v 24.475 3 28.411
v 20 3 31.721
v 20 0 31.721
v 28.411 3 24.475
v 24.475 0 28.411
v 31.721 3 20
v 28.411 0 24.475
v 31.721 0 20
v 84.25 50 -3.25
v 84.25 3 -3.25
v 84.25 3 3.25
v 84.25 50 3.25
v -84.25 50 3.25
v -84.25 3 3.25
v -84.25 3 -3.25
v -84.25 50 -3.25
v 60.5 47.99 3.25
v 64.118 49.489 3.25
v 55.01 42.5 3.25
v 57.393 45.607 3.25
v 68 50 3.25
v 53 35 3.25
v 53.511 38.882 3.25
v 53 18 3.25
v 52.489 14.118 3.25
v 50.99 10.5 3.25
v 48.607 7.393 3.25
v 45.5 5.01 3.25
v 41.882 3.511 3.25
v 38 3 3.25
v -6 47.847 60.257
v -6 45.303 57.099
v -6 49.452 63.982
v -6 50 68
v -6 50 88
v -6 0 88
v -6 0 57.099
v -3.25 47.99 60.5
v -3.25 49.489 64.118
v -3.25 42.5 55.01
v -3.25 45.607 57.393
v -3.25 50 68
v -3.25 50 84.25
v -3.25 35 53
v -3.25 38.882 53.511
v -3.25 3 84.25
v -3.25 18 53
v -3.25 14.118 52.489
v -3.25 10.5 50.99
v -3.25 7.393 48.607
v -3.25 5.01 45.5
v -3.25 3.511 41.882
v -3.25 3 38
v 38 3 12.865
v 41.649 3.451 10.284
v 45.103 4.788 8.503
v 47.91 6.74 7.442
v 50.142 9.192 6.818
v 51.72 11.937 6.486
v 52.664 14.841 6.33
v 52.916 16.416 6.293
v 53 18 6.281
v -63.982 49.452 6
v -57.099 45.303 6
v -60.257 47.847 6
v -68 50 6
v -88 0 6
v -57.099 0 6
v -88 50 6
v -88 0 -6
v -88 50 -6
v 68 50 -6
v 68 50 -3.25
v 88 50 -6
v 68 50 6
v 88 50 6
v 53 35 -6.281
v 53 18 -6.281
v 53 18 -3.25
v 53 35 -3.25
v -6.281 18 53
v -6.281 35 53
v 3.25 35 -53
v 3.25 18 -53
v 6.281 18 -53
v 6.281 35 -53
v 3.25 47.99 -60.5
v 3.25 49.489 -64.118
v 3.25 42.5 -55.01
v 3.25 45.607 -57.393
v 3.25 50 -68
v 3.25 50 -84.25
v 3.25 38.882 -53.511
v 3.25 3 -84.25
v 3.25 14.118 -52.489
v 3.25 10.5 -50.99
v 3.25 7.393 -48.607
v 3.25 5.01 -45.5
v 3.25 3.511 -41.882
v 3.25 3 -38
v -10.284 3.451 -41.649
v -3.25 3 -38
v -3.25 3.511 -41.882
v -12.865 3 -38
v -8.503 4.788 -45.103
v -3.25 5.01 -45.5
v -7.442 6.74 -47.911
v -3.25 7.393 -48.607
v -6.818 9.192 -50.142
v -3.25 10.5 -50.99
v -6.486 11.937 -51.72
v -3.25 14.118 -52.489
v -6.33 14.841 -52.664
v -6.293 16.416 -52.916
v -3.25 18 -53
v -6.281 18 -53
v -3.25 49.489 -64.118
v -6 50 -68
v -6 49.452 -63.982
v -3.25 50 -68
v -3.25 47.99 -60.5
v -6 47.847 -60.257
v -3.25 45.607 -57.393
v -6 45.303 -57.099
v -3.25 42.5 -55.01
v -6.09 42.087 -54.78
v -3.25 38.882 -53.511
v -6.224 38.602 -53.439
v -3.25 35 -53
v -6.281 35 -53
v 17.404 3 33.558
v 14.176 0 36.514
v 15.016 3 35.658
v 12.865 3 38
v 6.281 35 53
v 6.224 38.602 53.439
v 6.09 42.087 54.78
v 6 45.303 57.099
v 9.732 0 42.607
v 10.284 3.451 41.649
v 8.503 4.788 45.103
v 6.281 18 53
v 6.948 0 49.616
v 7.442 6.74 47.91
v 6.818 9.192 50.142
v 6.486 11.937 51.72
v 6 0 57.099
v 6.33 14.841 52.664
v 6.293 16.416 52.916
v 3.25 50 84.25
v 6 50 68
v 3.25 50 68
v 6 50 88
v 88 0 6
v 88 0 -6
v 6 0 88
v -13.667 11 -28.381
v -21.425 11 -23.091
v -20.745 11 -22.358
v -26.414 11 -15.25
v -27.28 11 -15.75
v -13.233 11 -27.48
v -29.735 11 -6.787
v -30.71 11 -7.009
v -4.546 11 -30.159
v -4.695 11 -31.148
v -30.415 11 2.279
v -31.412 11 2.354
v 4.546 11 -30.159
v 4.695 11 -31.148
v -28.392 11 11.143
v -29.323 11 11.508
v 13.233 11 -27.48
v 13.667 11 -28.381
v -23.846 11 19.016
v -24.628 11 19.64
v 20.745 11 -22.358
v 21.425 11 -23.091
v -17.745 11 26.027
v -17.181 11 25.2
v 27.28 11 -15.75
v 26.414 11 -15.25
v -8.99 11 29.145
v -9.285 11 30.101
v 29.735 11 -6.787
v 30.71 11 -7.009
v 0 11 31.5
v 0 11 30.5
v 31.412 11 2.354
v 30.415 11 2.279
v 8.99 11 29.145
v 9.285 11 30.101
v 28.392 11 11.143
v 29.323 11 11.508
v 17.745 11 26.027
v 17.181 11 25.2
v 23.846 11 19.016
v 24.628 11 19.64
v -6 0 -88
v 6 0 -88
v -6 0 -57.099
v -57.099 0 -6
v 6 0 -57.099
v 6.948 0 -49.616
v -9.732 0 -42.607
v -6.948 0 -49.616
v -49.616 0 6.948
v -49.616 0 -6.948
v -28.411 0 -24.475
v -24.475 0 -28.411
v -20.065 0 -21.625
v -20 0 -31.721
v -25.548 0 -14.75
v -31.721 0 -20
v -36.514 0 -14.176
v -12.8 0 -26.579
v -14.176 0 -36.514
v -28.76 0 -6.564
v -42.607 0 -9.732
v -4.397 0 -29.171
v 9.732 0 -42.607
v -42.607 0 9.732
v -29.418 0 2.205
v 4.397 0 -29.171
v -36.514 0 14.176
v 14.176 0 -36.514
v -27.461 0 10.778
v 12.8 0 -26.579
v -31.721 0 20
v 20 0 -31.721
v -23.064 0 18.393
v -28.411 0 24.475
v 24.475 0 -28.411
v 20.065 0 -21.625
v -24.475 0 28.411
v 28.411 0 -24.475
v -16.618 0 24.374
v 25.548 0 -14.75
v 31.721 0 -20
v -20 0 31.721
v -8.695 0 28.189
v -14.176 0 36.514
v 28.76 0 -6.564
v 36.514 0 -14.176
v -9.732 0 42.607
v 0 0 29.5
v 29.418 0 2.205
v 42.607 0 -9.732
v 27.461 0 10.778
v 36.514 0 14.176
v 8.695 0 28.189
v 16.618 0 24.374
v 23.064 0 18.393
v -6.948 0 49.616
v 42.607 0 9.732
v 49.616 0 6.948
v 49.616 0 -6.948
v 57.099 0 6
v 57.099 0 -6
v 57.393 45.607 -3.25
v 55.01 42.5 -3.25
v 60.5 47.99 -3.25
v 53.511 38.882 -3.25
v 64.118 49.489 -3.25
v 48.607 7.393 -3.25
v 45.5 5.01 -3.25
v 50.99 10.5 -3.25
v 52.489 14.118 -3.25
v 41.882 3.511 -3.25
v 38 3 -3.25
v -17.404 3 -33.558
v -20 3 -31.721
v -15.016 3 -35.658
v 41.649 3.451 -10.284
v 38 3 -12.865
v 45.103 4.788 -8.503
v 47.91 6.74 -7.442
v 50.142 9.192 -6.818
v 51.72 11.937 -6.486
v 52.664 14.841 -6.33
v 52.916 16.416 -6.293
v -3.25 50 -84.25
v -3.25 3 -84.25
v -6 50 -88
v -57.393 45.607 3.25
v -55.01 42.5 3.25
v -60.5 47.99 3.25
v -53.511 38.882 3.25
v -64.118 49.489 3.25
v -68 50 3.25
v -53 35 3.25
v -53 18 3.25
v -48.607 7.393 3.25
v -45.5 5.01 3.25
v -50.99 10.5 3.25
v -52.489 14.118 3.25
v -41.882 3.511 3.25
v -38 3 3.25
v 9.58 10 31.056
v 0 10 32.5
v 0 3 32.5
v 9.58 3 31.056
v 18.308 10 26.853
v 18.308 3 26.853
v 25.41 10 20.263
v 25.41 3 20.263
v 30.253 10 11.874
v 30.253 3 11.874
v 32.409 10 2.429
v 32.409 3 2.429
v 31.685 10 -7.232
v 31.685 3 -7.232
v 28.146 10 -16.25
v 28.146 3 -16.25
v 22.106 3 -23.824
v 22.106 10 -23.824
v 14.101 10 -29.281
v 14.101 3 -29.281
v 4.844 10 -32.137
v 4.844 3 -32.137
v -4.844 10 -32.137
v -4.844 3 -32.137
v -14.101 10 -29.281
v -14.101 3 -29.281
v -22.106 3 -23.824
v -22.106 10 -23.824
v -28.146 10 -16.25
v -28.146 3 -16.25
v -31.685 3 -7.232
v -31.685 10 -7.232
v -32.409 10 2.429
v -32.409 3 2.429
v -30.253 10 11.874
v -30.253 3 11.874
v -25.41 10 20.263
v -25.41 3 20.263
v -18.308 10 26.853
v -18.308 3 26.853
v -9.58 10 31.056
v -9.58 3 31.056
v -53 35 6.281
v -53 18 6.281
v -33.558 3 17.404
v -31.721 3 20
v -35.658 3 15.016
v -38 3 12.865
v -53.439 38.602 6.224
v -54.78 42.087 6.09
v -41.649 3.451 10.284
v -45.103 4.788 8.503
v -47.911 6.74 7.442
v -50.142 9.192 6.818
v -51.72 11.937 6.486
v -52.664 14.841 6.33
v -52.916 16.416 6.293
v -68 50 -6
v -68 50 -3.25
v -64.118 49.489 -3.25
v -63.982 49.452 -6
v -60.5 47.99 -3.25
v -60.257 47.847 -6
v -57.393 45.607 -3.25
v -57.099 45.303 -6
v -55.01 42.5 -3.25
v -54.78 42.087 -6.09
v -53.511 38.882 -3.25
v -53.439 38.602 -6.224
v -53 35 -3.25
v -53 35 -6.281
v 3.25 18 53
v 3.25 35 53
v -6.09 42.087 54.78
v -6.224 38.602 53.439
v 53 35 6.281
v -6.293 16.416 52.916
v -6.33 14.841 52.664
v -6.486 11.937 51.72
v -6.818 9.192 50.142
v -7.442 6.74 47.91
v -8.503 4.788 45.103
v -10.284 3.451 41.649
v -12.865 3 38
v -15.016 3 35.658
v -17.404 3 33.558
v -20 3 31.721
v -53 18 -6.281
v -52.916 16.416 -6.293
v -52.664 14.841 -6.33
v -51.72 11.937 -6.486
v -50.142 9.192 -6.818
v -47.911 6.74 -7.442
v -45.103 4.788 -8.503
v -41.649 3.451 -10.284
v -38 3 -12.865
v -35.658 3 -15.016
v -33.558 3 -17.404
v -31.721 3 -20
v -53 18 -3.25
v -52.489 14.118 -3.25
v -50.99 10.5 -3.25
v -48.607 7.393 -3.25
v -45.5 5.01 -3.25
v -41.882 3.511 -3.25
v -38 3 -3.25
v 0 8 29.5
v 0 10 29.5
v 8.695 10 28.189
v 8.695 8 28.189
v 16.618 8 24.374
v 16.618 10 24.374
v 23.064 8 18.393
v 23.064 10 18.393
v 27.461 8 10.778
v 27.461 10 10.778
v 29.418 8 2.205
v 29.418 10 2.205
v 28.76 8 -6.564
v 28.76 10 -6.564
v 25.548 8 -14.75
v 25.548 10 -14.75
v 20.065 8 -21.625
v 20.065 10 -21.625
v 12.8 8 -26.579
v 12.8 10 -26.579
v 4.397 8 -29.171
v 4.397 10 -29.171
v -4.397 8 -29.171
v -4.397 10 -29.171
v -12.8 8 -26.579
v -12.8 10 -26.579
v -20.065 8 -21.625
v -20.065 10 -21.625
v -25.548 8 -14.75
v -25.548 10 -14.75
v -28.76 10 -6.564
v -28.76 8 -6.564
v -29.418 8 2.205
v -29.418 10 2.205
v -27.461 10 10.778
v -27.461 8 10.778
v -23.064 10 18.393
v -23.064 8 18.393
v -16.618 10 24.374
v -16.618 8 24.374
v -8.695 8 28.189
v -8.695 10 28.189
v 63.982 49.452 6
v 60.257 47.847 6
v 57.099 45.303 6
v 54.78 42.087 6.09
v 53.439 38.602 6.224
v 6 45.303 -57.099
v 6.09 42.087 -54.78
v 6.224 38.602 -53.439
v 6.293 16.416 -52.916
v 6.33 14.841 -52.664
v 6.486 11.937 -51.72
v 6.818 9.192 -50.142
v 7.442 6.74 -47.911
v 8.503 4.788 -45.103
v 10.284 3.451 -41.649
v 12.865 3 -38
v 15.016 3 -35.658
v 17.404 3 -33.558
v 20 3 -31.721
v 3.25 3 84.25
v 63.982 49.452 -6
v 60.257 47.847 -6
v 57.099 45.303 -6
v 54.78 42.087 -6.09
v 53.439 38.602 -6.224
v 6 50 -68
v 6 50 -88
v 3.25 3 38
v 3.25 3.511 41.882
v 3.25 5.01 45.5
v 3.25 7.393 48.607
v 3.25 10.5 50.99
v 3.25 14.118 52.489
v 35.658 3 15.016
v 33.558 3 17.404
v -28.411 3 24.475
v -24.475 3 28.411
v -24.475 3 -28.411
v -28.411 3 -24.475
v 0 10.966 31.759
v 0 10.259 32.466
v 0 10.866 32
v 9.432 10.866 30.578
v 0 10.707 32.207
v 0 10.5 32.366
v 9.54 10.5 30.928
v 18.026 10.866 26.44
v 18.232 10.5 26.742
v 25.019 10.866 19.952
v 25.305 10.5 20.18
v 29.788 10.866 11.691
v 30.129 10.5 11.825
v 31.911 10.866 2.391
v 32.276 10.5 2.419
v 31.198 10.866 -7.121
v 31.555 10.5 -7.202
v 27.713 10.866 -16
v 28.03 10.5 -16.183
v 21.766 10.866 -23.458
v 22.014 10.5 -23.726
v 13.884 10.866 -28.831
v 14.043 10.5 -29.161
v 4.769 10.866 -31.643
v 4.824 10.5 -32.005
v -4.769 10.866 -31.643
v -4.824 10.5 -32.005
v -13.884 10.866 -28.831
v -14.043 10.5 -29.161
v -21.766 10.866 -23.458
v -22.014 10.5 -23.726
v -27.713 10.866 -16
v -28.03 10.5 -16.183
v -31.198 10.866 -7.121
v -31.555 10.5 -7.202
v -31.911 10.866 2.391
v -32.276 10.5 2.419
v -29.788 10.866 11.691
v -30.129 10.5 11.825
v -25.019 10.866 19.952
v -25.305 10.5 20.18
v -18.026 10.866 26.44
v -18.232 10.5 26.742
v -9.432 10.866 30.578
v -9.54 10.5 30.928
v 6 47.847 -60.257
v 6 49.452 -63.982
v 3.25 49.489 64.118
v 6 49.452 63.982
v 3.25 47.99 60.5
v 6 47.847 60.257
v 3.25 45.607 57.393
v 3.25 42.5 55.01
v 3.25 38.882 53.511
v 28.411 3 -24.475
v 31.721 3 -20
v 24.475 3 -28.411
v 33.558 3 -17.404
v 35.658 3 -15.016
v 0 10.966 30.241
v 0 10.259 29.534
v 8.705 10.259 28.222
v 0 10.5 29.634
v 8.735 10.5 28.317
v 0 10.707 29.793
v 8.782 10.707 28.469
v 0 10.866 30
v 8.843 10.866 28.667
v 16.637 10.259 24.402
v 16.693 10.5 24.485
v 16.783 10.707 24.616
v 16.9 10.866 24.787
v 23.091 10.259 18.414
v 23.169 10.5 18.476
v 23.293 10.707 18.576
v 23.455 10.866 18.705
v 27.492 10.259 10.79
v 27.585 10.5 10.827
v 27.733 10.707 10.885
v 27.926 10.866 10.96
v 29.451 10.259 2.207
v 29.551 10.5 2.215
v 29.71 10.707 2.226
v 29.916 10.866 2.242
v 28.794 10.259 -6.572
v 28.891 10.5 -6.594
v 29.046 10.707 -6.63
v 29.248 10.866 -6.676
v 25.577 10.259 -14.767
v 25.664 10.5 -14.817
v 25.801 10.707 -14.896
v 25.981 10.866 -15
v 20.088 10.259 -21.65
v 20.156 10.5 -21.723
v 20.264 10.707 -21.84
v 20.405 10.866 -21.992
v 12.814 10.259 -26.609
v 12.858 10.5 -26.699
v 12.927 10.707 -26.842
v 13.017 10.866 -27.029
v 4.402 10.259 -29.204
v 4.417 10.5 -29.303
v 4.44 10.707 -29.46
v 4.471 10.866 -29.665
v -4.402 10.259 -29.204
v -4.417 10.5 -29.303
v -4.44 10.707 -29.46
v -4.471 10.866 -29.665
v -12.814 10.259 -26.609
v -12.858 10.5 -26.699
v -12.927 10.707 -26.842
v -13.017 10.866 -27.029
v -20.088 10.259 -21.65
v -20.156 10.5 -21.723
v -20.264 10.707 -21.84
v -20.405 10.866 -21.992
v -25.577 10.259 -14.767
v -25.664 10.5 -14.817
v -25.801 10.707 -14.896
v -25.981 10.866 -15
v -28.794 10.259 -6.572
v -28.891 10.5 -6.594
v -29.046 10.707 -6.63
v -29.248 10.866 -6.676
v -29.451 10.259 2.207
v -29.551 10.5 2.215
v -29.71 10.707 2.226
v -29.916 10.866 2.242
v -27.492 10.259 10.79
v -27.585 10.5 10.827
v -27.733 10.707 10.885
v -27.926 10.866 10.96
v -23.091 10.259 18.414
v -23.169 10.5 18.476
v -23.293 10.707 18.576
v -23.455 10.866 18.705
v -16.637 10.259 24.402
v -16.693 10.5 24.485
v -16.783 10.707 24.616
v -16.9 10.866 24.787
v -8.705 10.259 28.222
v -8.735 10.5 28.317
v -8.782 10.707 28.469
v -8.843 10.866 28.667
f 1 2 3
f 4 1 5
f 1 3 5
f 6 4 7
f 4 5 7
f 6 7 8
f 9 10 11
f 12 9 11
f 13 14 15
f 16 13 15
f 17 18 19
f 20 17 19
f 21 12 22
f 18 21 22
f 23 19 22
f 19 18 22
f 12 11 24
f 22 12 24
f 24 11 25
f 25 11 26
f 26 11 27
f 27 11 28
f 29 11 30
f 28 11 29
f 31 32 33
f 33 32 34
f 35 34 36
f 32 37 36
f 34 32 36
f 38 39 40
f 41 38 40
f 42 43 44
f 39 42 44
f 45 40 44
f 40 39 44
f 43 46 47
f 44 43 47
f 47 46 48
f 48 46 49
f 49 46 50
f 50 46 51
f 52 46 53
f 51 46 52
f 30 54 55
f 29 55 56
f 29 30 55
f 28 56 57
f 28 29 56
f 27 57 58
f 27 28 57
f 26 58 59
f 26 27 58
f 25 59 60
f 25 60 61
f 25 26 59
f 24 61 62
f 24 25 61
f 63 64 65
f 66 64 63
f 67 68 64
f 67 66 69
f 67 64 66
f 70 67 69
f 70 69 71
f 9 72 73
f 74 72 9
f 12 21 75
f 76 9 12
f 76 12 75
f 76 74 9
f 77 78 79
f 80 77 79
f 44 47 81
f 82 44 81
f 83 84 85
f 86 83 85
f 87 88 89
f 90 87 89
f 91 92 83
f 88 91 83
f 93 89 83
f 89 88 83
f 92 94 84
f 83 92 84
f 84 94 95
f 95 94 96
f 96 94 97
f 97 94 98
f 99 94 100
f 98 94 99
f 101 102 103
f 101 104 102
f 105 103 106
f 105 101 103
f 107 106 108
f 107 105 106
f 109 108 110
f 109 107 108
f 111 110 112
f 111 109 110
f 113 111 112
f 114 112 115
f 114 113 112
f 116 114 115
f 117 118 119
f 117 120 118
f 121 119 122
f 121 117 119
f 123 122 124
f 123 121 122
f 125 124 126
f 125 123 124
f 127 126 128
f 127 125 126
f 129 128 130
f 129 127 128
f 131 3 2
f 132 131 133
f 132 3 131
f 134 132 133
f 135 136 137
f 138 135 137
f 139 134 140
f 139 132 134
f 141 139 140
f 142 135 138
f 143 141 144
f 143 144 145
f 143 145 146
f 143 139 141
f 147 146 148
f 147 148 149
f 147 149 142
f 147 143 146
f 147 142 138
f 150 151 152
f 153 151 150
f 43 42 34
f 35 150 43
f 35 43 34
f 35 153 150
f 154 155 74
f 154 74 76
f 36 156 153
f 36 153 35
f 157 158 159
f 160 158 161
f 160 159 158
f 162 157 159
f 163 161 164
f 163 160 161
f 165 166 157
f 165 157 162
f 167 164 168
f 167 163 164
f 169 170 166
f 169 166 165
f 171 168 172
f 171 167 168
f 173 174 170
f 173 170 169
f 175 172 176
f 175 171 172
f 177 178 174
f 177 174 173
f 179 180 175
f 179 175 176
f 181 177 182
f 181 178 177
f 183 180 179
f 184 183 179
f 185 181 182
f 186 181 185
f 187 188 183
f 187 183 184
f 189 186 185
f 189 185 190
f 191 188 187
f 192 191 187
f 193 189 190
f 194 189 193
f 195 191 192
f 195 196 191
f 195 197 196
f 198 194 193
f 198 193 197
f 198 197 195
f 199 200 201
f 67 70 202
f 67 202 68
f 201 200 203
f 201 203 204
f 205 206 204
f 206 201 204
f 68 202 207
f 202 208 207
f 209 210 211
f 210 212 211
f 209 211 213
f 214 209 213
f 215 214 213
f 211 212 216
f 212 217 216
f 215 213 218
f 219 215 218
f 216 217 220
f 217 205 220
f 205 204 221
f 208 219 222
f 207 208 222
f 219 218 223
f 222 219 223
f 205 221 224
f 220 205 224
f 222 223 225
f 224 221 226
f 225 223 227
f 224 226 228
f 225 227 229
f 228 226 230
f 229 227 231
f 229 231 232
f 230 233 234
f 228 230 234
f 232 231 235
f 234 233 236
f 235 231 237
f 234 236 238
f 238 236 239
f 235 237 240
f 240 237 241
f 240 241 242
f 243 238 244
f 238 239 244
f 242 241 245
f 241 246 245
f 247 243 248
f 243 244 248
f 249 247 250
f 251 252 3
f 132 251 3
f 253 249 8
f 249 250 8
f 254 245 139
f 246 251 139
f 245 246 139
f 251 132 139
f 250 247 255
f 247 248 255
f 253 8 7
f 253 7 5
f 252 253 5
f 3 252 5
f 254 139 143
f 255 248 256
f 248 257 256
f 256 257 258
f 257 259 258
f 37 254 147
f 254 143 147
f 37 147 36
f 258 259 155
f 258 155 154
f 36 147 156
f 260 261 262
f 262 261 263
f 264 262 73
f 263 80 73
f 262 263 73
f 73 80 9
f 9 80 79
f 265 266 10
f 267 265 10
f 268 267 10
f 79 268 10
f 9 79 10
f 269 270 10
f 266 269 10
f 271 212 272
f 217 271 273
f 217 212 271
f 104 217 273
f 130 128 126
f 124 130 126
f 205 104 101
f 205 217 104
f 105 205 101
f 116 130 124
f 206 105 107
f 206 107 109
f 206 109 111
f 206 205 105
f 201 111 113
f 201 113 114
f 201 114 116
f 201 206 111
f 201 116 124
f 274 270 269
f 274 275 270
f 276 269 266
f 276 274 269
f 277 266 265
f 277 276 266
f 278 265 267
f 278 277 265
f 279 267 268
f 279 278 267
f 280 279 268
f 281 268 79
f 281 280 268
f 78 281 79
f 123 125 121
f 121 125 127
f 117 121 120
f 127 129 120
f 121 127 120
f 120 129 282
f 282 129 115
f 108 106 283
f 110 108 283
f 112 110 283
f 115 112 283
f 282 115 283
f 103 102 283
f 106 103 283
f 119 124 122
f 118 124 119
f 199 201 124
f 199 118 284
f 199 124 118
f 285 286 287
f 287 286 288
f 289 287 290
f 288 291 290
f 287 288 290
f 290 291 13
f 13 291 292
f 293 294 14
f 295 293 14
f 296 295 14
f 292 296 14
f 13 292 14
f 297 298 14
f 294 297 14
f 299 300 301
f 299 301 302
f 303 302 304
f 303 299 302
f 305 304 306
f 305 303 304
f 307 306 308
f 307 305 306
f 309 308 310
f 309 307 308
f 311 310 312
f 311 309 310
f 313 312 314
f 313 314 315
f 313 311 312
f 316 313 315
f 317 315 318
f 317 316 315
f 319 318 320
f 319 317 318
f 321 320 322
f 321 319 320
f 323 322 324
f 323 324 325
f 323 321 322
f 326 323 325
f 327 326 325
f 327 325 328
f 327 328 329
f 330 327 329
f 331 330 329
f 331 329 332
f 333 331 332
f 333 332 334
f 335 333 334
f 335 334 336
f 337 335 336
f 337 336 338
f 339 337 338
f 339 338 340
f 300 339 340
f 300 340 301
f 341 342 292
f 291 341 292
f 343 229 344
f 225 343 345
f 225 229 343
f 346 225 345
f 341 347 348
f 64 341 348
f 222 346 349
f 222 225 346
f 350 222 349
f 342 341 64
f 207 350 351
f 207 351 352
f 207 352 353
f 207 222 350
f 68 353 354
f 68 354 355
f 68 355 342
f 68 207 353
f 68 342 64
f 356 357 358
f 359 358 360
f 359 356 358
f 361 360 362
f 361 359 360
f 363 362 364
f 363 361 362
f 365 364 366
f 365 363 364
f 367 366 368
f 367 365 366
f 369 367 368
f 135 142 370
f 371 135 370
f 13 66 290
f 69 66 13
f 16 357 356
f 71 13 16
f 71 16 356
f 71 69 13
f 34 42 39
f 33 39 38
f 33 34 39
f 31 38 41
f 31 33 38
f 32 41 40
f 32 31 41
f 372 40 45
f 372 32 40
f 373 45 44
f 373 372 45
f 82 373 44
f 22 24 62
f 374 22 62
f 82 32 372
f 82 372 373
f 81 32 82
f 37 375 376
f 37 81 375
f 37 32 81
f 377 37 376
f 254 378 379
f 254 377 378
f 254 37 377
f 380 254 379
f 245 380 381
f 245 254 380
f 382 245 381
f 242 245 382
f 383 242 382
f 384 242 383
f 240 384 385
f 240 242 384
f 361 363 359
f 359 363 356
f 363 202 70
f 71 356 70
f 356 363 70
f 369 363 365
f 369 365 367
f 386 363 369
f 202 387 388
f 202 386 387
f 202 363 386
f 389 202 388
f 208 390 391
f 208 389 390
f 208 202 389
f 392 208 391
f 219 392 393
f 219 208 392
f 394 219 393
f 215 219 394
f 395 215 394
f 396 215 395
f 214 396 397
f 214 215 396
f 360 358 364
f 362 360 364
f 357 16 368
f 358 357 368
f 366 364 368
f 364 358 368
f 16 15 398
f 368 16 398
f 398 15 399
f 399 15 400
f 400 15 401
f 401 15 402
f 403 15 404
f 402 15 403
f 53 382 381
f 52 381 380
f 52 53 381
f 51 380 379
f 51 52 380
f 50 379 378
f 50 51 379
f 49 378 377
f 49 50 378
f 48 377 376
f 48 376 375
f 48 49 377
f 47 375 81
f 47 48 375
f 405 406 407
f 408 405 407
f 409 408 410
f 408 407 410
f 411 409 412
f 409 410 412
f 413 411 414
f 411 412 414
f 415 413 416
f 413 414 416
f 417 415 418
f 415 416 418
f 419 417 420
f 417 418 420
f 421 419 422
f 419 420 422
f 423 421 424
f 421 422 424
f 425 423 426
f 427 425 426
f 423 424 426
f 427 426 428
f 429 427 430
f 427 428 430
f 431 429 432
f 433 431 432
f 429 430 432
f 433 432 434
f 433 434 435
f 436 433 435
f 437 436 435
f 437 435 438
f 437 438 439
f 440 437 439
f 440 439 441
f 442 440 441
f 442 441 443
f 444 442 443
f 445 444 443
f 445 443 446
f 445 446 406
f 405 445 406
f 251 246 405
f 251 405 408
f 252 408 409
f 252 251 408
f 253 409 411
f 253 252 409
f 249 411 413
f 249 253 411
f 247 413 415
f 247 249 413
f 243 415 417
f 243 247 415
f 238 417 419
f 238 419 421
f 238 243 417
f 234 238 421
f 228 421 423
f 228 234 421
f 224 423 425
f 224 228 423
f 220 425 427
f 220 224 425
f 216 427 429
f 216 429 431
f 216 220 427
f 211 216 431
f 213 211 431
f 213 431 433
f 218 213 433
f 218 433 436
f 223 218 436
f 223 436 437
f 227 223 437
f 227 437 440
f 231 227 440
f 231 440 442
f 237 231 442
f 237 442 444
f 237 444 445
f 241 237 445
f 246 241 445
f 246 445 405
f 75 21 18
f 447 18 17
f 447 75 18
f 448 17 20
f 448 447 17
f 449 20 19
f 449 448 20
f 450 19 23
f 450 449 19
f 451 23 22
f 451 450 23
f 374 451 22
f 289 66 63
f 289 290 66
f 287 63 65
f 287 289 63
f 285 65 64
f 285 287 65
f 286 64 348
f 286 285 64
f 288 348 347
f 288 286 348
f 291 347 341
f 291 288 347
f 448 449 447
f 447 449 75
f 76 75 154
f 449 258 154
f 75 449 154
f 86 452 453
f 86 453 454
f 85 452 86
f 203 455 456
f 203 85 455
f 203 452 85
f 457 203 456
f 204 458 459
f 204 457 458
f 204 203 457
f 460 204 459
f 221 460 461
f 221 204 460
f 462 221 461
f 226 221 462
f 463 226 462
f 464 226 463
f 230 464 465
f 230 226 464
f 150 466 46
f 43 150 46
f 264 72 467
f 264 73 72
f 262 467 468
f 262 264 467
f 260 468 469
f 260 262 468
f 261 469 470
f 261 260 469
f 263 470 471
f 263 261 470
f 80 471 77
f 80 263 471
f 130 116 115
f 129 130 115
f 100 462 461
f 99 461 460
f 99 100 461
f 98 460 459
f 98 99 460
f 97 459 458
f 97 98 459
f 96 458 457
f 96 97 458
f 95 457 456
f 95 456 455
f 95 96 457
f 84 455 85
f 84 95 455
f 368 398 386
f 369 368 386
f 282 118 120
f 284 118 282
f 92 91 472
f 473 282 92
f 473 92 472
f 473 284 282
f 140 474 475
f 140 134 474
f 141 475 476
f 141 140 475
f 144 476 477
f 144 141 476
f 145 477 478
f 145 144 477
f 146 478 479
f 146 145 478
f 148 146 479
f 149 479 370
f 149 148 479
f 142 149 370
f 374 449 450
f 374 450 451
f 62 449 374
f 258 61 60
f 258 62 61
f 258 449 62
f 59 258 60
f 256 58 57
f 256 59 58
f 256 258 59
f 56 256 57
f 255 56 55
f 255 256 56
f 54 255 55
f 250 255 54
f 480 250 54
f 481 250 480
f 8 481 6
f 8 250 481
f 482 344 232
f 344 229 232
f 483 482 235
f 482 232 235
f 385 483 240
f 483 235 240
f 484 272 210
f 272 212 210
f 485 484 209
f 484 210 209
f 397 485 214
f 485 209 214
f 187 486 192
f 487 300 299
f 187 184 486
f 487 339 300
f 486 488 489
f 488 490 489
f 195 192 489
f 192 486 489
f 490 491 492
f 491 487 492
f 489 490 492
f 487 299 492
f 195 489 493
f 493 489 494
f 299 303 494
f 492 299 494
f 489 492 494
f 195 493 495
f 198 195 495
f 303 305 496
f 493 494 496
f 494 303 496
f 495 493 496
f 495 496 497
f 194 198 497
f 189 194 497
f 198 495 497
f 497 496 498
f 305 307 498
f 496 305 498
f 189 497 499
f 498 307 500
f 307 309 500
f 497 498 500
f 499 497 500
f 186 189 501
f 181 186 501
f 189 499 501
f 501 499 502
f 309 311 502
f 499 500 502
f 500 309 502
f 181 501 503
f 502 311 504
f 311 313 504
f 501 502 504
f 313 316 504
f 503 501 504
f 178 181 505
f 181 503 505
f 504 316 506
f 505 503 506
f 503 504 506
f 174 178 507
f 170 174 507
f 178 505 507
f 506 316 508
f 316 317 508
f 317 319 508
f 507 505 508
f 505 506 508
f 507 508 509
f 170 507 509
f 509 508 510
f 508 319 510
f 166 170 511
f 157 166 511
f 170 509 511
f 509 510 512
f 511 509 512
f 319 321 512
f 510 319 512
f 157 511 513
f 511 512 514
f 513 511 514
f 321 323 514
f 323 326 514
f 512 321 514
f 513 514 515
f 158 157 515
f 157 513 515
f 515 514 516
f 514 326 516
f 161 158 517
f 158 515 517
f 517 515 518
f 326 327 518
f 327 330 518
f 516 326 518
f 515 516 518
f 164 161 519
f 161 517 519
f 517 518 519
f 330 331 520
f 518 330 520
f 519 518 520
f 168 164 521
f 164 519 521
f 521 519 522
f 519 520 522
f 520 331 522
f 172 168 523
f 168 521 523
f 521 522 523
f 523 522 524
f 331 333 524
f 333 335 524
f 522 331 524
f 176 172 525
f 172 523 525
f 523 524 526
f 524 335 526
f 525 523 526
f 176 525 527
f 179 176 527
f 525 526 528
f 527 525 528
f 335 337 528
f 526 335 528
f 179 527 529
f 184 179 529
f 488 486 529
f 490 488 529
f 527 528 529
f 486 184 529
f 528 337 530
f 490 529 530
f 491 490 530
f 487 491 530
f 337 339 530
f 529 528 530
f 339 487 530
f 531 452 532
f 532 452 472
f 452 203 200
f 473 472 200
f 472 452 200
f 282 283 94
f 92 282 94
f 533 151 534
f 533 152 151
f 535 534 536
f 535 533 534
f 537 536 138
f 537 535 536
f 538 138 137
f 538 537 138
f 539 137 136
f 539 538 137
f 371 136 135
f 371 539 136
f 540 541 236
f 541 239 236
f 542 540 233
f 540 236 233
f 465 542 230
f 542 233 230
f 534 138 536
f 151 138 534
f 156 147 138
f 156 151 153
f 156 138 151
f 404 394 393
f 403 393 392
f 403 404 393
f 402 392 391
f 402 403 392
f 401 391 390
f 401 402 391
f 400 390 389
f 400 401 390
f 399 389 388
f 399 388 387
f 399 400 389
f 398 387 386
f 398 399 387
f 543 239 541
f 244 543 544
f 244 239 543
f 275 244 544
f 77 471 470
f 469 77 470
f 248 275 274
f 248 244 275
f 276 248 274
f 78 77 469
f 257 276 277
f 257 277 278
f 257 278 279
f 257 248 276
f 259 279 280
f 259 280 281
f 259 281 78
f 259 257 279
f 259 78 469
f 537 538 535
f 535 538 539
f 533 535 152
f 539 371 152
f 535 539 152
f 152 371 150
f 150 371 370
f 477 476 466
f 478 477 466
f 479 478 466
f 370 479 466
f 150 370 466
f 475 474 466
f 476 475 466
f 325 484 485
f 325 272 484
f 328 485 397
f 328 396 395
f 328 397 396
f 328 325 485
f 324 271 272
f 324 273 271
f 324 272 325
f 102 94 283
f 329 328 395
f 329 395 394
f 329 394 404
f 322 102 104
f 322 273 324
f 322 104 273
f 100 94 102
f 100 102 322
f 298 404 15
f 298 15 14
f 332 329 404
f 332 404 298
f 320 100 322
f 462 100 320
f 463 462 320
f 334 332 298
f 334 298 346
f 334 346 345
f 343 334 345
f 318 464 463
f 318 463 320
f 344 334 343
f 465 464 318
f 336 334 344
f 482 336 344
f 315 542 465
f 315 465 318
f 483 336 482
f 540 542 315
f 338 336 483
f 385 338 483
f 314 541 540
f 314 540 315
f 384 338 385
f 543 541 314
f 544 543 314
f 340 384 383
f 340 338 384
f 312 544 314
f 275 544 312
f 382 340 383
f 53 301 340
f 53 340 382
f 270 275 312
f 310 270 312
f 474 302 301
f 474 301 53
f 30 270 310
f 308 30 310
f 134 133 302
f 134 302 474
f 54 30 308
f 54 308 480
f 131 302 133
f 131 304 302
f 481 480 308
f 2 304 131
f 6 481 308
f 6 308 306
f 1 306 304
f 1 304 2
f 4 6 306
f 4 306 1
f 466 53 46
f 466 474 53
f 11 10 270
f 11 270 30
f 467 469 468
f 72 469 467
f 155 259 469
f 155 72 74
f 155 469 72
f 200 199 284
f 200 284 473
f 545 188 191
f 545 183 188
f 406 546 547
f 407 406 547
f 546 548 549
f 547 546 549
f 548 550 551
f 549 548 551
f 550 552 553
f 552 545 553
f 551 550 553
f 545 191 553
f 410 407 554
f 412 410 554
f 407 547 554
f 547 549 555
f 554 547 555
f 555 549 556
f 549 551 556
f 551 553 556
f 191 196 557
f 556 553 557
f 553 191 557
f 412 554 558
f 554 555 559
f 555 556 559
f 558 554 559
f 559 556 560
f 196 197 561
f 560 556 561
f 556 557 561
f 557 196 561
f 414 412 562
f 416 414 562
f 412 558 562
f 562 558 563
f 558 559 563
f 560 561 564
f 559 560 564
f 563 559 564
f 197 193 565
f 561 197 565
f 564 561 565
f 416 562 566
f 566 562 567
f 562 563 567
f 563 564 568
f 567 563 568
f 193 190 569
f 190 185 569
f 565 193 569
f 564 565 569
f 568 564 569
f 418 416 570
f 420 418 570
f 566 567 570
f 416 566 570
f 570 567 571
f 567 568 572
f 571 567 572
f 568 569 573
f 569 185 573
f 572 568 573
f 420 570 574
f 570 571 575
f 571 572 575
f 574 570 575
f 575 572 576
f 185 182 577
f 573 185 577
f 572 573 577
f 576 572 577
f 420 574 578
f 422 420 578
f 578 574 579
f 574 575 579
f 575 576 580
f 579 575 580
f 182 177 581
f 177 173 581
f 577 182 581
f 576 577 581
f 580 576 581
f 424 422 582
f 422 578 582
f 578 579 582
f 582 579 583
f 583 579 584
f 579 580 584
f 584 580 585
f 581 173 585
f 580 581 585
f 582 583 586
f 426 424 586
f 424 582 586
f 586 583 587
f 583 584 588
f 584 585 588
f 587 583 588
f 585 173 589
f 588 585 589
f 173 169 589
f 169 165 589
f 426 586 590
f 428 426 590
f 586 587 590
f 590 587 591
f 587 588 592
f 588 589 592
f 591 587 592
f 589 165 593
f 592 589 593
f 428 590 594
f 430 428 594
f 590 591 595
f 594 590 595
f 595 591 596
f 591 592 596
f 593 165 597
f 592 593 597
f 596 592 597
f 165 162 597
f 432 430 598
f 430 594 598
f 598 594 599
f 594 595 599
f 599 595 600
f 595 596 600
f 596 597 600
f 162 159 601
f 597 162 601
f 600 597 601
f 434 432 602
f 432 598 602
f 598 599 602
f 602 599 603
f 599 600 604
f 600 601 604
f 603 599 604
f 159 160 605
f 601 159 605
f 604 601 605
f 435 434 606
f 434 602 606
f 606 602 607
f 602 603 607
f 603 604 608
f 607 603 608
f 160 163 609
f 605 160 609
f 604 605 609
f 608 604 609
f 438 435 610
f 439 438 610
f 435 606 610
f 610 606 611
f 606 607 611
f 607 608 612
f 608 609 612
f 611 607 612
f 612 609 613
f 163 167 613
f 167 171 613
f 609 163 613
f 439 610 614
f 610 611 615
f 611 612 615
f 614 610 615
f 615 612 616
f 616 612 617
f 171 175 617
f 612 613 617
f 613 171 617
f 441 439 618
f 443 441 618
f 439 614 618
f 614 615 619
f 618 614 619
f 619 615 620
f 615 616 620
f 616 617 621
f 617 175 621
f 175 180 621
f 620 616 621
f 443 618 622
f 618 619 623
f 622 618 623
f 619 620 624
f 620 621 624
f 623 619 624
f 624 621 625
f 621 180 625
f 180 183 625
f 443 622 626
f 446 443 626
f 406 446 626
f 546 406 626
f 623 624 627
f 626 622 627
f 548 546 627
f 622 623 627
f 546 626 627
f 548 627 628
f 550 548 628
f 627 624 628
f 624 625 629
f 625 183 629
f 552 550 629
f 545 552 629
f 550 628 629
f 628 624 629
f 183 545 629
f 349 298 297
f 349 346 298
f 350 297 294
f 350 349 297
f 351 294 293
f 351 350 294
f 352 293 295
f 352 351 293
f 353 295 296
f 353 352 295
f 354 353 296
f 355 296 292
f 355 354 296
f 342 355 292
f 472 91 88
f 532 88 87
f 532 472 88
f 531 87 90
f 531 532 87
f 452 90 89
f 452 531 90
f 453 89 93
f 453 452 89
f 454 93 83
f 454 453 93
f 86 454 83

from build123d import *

# Parameters (mm, degrees)
SKETCH1_R                = 37.5
BASE_DEPTH               = 3
SKETCH2_W                = 12
SKETCH2_H                = 88
FIN_EXTENSION_BASE_DEPTH = 3
FIN_CRADDLE_DEPTH        = 50
FILLET2_R                = 30
FILLET1_R                = 15
CIRPATTERN1_COUNT        = 4
FILLET2_OF_CIRPATTERN1_R = 30
FILLET1_OF_CIRPATTERN1_R = 15
BOSS_EXTRUDE5_REACH      = 132.419
SKETCH4_R                = 32.5
SKETCH4_R_2              = 29.5
FILLET3_R                = 5
FILLET4_R                = 1
SKETCH5_R                = 29.5
CUT_EXTRUDE1_DEPTH       = 135.119349872


with BuildPart() as part:
    # Sketch1 → BASE (new body)
    with BuildSketch(Plane(origin=(0, 0, 0), x_dir=(1, 0, 0), z_dir=(0, 1, 0))):
        with Locations(Location((0, 0, 0), (0, 0, 270))):
            Circle(SKETCH1_R)
    extrude(amount=BASE_DEPTH)

    # Sketch2 → FIN EXTENSION BASE (add)
    with BuildSketch(Plane(origin=(0, 0, 0), x_dir=(1, 0, 0), z_dir=(0, 1, 0))):
        with Locations((0, 44)):
            Rectangle(SKETCH2_W, SKETCH2_H)
    fin_extension_base = extrude(amount=FIN_EXTENSION_BASE_DEPTH)

    # Sketch3 → FIN CRADDLE (add)
    with BuildSketch(Plane(origin=(0, 0, 0), x_dir=(1, 0, 0), z_dir=(0, 1, 0))):
        Polygon((-6, 53), (-3.25, 53), (-3.25, 84.25), (3.25, 84.25), (3.25, 53), (6, 53), (6, 88), (-6, 88), align=None)
    fin_craddle = extrude(amount=FIN_CRADDLE_DEPTH)

    # Fillet2
    fillet2_edges = [part.edges().sort_by_distance(p)[0] for p in [
        (6, 1.5, -37.016888038),
        (-6, 1.5, -37.016888038),
    ]]
    fillet(fillet2_edges, radius=FILLET2_R)

    # Fillet1
    fillet1_edges = [part.edges().sort_by_distance(p)[0] for p in [
        (-4.765646996, 50, -53),
        (4.765646996, 50, -53),
        (-4.765646996, 3, -53),
        (4.765646996, 3, -53),
    ]]
    fillet(fillet1_edges, radius=FILLET1_R)

    # CirPattern1: FIN EXTENSION BASE, FIN CRADDLE ×4 about axis
    cirpattern1_axis = Axis((0, 0, 0), (0, 1, 0))
    add([fin_extension_base.rotate(cirpattern1_axis, i * 360 / CIRPATTERN1_COUNT) for i in range(1, CIRPATTERN1_COUNT)])
    add([fin_craddle.rotate(cirpattern1_axis, i * 360 / CIRPATTERN1_COUNT) for i in range(1, CIRPATTERN1_COUNT)])

    # Fillet2 of CirPattern1
    fillet2_of_cirpattern1_edges = [part.edges().sort_by_distance(p)[0] for p in [
        (-37.016888038, 1.5, -6),
        (-37.016888038, 1.5, 6),
        (-6, 1.5, 37.016888038),
        (6, 1.5, 37.016888038),
        (37.016888038, 1.5, 6),
        (37.016888038, 1.5, -6),
    ]]
    fillet(fillet2_of_cirpattern1_edges, radius=FILLET2_OF_CIRPATTERN1_R)

    # Fillet1 of CirPattern1
    fillet1_of_cirpattern1_edges = [part.edges().sort_by_distance(p)[0] for p in [
        (-53, 50, 4.765646996),
        (-53, 50, -4.765646996),
        (-53, 3, 4.765646996),
        (-53, 3, -4.765646996),
        (4.765646996, 50, 53),
        (-4.765646996, 50, 53),
        (4.765646996, 3, 53),
        (-4.765646996, 3, 53),
        (53, 50, -4.765646996),
        (53, 50, 4.765646996),
        (53, 3, -4.765646996),
        (53, 3, 4.765646996),
    ]]
    fillet(fillet1_of_cirpattern1_edges, radius=FILLET1_OF_CIRPATTERN1_R)

    # Sketch4 → Boss-Extrude5 (add, up to next)
    with BuildSketch(Plane(origin=(0, 11, 0), x_dir=(1, 0, 0), z_dir=(0, 1, 0)), mode=Mode.PRIVATE) as boss_extrude5_sk1:
        with Locations(Location((0, 0, 0), (0, 0, 270))):
            Circle(SKETCH4_R)
        with Locations(Location((0, 0, 0), (0, 0, 270))):
            Circle(SKETCH4_R_2, mode=Mode.SUBTRACT)
    boss_extrude5_tool1 = extrude(boss_extrude5_sk1.sketch, amount=-BOSS_EXTRUDE5_REACH, mode=Mode.PRIVATE) - part.part
    add(boss_extrude5_tool1.solids().sort_by_distance((0, 11, -31.580761))[0])

    # Fillet3
    fillet3_edges = [part.edges().sort_by_distance(p)[0] for p in [
        (0, 3, -29.5),
    ]]
    fillet(fillet3_edges, radius=FILLET3_R)

    # Fillet4
    fillet4_edges = [part.edges().sort_by_distance(p)[0] for p in [
        (0, 11, -32.5),
        (0, 11, -29.5),
    ]]
    fillet(fillet4_edges, radius=FILLET4_R)

    # Sketch5 → Cut-Extrude1 (cut, through all)
    with BuildSketch(Plane(origin=(0, 0, 0), x_dir=(1, 0, 0), z_dir=(0, 1, 0))):
        with Locations(Location((0, 0, 0), (0, 0, 270))):
            Circle(SKETCH5_R)
    extrude(amount=CUT_EXTRUDE1_DEPTH, mode=Mode.SUBTRACT)


solid = part.part
